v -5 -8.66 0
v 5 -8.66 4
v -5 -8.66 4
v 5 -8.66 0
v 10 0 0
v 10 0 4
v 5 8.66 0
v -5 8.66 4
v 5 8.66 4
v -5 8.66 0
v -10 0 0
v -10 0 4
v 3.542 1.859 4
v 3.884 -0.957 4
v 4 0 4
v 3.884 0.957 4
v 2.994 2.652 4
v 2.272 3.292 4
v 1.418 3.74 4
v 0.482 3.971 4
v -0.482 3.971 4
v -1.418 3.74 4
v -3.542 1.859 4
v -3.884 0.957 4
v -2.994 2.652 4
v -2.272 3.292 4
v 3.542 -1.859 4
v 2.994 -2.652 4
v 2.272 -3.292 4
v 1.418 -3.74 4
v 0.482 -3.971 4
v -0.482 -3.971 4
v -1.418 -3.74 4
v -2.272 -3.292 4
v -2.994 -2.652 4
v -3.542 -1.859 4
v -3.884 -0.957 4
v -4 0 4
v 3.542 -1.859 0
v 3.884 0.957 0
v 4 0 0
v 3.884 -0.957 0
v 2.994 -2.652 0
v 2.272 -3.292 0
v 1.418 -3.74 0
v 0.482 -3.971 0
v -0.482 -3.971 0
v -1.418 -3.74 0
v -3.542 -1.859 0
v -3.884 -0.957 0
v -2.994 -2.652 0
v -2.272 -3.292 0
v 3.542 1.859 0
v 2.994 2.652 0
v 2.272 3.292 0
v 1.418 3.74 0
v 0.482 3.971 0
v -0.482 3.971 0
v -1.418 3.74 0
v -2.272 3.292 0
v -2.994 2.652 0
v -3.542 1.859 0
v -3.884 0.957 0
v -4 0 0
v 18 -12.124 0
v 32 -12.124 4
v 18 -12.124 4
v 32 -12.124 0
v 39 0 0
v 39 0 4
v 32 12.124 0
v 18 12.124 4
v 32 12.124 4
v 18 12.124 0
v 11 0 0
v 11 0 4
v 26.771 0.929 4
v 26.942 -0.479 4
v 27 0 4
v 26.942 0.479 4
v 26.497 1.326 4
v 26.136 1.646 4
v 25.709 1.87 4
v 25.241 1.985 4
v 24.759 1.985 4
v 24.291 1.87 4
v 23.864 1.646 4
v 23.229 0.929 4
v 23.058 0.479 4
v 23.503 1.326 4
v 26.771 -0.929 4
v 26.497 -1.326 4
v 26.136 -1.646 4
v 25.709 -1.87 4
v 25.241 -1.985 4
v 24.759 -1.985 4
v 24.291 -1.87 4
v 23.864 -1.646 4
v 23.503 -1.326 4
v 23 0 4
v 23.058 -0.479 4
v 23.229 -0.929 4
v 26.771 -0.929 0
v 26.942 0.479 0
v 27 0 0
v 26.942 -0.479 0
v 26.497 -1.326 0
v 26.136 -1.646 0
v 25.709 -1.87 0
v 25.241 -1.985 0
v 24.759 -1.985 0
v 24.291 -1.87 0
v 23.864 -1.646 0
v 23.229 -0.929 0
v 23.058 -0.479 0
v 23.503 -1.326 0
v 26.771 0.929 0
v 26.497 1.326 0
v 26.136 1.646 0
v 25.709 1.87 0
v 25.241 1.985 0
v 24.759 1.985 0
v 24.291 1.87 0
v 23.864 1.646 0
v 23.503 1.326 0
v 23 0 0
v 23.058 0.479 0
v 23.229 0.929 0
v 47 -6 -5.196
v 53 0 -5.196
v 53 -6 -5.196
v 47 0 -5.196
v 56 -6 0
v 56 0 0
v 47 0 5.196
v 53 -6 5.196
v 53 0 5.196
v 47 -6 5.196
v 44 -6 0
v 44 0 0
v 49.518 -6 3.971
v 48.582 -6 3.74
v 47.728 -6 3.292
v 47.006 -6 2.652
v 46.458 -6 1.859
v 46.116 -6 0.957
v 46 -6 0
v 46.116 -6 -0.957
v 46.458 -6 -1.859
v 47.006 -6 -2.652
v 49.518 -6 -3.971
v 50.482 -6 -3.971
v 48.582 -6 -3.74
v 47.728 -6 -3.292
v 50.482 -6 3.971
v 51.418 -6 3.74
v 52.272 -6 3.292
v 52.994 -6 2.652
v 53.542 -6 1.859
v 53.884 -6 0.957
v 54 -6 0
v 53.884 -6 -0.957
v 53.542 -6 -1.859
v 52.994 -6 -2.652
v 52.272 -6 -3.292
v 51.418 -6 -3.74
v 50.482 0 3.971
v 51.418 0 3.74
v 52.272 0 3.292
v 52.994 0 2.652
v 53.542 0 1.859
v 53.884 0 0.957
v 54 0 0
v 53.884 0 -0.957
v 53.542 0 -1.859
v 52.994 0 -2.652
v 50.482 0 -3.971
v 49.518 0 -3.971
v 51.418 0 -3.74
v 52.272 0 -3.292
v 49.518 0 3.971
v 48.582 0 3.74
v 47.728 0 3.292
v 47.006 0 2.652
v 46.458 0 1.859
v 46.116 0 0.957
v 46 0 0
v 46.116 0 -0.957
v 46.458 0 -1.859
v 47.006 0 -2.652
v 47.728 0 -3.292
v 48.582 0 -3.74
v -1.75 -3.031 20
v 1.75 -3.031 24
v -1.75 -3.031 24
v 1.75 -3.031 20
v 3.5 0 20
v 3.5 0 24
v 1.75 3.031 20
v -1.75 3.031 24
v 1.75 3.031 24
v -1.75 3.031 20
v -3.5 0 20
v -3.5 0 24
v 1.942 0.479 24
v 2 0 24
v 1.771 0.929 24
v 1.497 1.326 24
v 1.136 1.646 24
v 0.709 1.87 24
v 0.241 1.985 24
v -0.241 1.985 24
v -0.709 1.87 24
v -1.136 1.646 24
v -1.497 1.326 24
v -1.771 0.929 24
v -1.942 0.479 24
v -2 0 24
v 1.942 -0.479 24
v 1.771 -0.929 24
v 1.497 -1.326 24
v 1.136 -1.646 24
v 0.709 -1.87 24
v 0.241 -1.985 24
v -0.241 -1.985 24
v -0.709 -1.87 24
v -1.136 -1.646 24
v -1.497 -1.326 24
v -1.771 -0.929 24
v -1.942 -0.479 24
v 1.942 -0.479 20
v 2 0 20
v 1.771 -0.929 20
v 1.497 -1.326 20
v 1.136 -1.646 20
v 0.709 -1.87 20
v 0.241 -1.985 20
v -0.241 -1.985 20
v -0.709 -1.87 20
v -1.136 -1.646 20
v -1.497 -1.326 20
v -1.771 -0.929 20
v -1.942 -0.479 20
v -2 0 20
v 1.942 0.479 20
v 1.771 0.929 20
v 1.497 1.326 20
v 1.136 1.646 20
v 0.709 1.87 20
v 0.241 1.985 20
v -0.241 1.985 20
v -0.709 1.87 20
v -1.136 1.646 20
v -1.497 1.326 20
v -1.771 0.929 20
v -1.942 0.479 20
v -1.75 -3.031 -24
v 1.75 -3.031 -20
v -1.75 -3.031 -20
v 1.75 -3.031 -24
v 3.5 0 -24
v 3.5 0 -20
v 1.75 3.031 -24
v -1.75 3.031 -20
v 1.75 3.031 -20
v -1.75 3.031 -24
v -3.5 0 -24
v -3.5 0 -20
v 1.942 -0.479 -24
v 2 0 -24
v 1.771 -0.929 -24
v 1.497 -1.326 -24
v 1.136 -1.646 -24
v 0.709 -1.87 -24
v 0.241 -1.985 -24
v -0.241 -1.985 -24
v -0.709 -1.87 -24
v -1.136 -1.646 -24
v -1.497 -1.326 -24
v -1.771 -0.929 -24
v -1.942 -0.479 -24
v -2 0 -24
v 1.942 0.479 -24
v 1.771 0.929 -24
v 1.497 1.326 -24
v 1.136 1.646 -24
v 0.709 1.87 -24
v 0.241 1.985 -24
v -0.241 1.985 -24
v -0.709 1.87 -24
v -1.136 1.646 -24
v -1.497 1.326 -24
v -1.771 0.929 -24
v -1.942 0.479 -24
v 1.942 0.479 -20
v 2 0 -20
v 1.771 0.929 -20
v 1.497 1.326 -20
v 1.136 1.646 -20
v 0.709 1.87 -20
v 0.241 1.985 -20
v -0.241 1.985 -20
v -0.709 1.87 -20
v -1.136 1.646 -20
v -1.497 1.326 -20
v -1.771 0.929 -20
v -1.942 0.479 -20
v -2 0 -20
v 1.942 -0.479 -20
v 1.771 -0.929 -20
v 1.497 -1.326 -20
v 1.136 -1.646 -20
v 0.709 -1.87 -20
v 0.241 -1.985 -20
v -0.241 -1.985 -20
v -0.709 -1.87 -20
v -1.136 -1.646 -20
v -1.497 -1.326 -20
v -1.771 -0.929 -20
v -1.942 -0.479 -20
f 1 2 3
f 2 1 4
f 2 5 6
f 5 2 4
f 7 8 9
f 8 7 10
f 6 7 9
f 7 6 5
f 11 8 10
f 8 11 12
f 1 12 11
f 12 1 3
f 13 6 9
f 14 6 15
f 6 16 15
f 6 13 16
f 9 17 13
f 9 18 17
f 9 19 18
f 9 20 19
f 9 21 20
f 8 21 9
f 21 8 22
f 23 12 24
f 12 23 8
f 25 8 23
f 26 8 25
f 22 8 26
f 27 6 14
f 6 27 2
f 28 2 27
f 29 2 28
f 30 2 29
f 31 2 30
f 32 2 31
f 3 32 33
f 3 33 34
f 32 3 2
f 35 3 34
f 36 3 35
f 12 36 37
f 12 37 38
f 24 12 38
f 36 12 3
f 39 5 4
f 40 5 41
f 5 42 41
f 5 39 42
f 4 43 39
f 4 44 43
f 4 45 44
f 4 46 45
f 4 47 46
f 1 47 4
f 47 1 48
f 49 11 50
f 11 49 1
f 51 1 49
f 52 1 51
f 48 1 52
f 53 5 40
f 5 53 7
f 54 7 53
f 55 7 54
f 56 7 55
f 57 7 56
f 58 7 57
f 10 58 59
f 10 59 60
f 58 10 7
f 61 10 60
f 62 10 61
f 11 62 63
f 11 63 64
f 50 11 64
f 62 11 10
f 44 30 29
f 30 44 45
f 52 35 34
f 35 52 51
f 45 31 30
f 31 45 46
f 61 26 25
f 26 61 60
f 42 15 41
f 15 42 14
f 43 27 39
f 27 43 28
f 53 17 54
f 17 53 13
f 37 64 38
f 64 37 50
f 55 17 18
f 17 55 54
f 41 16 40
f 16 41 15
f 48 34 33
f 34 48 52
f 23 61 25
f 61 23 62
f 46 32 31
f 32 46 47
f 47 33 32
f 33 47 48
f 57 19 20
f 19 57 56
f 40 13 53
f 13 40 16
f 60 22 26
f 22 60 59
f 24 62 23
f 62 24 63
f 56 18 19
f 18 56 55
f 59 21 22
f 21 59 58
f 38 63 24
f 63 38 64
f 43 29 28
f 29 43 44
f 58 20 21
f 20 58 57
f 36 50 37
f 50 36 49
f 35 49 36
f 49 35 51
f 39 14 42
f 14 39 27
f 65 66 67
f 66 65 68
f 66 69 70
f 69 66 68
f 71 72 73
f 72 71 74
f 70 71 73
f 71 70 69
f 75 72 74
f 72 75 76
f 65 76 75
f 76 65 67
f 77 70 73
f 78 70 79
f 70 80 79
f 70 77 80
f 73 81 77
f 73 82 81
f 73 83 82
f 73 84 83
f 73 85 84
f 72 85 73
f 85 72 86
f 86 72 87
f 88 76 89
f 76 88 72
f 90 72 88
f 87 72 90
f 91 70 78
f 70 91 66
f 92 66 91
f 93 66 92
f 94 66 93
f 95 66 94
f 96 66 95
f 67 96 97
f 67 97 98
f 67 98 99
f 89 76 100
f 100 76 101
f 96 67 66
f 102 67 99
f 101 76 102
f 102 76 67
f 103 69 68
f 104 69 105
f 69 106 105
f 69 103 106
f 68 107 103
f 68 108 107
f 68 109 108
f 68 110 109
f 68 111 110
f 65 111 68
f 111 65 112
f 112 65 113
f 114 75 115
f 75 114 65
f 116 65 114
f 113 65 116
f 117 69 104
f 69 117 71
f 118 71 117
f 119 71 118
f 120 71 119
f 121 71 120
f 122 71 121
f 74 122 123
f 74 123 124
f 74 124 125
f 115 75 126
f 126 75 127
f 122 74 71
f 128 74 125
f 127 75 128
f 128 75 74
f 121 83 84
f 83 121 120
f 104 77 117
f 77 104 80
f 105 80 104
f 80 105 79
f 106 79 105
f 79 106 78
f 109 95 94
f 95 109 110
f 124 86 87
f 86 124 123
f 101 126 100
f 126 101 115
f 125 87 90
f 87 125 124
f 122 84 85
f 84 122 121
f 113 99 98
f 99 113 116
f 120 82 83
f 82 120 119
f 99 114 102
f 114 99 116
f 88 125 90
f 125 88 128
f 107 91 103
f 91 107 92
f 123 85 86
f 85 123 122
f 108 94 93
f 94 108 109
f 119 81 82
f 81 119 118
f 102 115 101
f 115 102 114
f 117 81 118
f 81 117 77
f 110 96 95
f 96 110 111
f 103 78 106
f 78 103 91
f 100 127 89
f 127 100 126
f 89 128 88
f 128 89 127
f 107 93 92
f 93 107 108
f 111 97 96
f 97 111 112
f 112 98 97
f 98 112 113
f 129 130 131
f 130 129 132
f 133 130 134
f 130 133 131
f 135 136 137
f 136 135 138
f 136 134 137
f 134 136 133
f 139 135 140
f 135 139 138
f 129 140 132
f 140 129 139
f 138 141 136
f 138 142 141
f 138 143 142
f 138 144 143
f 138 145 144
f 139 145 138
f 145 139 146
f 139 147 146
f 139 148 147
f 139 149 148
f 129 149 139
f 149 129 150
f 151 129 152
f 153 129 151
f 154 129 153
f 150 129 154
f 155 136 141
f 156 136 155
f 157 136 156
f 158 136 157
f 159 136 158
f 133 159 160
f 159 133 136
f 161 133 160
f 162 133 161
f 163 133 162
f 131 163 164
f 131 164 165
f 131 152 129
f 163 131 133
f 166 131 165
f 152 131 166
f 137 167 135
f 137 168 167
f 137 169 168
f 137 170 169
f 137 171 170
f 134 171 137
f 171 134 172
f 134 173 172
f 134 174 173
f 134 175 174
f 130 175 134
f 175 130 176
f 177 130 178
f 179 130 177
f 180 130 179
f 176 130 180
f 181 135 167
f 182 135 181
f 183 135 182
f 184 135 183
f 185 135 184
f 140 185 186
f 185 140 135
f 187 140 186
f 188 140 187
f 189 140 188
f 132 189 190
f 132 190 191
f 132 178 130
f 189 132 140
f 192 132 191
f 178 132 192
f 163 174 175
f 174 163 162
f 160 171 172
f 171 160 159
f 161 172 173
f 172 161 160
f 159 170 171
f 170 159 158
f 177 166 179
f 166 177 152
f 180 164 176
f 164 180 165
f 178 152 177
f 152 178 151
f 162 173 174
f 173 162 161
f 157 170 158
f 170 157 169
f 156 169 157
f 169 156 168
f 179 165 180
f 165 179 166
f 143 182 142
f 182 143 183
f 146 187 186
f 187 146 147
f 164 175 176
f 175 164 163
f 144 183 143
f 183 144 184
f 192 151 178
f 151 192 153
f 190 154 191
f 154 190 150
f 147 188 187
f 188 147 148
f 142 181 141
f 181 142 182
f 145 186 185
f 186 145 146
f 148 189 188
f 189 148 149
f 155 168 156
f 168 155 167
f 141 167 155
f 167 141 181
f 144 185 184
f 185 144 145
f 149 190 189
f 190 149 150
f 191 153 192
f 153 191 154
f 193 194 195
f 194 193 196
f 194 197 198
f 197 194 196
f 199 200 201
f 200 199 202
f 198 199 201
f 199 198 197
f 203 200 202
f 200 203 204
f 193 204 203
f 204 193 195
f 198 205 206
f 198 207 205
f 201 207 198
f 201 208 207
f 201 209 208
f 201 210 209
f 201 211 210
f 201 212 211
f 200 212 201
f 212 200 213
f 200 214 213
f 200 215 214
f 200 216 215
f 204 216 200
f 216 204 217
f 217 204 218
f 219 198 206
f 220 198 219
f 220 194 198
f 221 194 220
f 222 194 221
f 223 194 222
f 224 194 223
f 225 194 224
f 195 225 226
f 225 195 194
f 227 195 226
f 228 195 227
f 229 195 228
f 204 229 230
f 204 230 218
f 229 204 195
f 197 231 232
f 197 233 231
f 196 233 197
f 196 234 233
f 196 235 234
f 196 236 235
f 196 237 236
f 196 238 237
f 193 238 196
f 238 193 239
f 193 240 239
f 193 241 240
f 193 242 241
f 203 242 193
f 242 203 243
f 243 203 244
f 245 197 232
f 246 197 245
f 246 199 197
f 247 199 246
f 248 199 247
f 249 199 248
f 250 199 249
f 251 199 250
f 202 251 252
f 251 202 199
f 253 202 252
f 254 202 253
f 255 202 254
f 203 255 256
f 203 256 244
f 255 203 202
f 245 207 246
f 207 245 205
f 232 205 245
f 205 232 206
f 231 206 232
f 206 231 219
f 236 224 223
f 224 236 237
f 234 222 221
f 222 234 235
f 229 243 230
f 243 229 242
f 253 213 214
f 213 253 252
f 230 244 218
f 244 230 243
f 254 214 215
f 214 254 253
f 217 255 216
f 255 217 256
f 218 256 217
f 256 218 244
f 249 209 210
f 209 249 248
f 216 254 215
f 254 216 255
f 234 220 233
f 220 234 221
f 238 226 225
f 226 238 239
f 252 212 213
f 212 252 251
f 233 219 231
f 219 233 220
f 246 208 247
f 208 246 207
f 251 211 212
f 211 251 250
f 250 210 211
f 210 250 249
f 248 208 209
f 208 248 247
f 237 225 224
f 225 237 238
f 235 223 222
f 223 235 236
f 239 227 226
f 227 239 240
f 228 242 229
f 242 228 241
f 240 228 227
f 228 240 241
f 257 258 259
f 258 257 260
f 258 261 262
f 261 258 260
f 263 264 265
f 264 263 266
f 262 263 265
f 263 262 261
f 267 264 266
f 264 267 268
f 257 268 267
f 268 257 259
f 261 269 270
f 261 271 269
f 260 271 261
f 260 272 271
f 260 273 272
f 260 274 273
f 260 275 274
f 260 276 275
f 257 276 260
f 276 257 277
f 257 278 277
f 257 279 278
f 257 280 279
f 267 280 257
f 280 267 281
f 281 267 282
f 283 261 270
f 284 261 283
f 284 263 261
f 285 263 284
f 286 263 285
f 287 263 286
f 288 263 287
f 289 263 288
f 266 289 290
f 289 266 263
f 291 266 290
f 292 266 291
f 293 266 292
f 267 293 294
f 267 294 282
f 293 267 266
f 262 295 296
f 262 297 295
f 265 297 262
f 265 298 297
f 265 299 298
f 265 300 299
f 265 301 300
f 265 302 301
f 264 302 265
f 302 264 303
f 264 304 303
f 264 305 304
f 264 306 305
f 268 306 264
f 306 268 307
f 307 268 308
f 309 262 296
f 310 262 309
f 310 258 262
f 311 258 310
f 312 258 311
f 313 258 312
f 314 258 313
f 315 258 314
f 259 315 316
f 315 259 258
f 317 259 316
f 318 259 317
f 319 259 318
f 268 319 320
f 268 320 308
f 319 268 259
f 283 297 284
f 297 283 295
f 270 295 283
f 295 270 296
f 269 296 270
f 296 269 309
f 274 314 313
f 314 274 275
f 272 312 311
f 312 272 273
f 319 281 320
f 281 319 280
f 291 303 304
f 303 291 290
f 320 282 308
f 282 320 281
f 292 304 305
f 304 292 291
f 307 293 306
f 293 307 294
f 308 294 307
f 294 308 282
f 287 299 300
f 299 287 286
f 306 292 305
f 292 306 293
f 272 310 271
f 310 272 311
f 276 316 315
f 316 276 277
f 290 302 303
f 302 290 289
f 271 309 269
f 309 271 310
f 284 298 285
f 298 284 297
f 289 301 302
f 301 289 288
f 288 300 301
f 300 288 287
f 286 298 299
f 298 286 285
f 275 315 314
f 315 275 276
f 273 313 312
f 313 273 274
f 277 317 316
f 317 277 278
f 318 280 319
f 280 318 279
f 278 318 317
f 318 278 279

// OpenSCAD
module piulita(raza_exterior, raza_interior, grosime)
{
    difference(){
        cylinder(h = grosime, r = raza_exterior, $fn = 6);
    
        translate ([0, 0, -1]) cylinder(h = grosime + 2, r = raza_interior, $fn = 26);
    }
}
//..................
module piulita_M4()
{
    piulita(3.5, 2,4);
}

//..................
color ("red") piulita(10, 4, 4);
color ("yellow") translate ([25, 0, 0]) piulita(14, 2, 4);

color("blue") translate ([50, 0, 0]) rotate([90, 0, 0]) piulita(6, 4, 6);

translate([0,0,20]) piulita_M4();

mirror([0,0,1])translate([0,0,20]) piulita_M4();
